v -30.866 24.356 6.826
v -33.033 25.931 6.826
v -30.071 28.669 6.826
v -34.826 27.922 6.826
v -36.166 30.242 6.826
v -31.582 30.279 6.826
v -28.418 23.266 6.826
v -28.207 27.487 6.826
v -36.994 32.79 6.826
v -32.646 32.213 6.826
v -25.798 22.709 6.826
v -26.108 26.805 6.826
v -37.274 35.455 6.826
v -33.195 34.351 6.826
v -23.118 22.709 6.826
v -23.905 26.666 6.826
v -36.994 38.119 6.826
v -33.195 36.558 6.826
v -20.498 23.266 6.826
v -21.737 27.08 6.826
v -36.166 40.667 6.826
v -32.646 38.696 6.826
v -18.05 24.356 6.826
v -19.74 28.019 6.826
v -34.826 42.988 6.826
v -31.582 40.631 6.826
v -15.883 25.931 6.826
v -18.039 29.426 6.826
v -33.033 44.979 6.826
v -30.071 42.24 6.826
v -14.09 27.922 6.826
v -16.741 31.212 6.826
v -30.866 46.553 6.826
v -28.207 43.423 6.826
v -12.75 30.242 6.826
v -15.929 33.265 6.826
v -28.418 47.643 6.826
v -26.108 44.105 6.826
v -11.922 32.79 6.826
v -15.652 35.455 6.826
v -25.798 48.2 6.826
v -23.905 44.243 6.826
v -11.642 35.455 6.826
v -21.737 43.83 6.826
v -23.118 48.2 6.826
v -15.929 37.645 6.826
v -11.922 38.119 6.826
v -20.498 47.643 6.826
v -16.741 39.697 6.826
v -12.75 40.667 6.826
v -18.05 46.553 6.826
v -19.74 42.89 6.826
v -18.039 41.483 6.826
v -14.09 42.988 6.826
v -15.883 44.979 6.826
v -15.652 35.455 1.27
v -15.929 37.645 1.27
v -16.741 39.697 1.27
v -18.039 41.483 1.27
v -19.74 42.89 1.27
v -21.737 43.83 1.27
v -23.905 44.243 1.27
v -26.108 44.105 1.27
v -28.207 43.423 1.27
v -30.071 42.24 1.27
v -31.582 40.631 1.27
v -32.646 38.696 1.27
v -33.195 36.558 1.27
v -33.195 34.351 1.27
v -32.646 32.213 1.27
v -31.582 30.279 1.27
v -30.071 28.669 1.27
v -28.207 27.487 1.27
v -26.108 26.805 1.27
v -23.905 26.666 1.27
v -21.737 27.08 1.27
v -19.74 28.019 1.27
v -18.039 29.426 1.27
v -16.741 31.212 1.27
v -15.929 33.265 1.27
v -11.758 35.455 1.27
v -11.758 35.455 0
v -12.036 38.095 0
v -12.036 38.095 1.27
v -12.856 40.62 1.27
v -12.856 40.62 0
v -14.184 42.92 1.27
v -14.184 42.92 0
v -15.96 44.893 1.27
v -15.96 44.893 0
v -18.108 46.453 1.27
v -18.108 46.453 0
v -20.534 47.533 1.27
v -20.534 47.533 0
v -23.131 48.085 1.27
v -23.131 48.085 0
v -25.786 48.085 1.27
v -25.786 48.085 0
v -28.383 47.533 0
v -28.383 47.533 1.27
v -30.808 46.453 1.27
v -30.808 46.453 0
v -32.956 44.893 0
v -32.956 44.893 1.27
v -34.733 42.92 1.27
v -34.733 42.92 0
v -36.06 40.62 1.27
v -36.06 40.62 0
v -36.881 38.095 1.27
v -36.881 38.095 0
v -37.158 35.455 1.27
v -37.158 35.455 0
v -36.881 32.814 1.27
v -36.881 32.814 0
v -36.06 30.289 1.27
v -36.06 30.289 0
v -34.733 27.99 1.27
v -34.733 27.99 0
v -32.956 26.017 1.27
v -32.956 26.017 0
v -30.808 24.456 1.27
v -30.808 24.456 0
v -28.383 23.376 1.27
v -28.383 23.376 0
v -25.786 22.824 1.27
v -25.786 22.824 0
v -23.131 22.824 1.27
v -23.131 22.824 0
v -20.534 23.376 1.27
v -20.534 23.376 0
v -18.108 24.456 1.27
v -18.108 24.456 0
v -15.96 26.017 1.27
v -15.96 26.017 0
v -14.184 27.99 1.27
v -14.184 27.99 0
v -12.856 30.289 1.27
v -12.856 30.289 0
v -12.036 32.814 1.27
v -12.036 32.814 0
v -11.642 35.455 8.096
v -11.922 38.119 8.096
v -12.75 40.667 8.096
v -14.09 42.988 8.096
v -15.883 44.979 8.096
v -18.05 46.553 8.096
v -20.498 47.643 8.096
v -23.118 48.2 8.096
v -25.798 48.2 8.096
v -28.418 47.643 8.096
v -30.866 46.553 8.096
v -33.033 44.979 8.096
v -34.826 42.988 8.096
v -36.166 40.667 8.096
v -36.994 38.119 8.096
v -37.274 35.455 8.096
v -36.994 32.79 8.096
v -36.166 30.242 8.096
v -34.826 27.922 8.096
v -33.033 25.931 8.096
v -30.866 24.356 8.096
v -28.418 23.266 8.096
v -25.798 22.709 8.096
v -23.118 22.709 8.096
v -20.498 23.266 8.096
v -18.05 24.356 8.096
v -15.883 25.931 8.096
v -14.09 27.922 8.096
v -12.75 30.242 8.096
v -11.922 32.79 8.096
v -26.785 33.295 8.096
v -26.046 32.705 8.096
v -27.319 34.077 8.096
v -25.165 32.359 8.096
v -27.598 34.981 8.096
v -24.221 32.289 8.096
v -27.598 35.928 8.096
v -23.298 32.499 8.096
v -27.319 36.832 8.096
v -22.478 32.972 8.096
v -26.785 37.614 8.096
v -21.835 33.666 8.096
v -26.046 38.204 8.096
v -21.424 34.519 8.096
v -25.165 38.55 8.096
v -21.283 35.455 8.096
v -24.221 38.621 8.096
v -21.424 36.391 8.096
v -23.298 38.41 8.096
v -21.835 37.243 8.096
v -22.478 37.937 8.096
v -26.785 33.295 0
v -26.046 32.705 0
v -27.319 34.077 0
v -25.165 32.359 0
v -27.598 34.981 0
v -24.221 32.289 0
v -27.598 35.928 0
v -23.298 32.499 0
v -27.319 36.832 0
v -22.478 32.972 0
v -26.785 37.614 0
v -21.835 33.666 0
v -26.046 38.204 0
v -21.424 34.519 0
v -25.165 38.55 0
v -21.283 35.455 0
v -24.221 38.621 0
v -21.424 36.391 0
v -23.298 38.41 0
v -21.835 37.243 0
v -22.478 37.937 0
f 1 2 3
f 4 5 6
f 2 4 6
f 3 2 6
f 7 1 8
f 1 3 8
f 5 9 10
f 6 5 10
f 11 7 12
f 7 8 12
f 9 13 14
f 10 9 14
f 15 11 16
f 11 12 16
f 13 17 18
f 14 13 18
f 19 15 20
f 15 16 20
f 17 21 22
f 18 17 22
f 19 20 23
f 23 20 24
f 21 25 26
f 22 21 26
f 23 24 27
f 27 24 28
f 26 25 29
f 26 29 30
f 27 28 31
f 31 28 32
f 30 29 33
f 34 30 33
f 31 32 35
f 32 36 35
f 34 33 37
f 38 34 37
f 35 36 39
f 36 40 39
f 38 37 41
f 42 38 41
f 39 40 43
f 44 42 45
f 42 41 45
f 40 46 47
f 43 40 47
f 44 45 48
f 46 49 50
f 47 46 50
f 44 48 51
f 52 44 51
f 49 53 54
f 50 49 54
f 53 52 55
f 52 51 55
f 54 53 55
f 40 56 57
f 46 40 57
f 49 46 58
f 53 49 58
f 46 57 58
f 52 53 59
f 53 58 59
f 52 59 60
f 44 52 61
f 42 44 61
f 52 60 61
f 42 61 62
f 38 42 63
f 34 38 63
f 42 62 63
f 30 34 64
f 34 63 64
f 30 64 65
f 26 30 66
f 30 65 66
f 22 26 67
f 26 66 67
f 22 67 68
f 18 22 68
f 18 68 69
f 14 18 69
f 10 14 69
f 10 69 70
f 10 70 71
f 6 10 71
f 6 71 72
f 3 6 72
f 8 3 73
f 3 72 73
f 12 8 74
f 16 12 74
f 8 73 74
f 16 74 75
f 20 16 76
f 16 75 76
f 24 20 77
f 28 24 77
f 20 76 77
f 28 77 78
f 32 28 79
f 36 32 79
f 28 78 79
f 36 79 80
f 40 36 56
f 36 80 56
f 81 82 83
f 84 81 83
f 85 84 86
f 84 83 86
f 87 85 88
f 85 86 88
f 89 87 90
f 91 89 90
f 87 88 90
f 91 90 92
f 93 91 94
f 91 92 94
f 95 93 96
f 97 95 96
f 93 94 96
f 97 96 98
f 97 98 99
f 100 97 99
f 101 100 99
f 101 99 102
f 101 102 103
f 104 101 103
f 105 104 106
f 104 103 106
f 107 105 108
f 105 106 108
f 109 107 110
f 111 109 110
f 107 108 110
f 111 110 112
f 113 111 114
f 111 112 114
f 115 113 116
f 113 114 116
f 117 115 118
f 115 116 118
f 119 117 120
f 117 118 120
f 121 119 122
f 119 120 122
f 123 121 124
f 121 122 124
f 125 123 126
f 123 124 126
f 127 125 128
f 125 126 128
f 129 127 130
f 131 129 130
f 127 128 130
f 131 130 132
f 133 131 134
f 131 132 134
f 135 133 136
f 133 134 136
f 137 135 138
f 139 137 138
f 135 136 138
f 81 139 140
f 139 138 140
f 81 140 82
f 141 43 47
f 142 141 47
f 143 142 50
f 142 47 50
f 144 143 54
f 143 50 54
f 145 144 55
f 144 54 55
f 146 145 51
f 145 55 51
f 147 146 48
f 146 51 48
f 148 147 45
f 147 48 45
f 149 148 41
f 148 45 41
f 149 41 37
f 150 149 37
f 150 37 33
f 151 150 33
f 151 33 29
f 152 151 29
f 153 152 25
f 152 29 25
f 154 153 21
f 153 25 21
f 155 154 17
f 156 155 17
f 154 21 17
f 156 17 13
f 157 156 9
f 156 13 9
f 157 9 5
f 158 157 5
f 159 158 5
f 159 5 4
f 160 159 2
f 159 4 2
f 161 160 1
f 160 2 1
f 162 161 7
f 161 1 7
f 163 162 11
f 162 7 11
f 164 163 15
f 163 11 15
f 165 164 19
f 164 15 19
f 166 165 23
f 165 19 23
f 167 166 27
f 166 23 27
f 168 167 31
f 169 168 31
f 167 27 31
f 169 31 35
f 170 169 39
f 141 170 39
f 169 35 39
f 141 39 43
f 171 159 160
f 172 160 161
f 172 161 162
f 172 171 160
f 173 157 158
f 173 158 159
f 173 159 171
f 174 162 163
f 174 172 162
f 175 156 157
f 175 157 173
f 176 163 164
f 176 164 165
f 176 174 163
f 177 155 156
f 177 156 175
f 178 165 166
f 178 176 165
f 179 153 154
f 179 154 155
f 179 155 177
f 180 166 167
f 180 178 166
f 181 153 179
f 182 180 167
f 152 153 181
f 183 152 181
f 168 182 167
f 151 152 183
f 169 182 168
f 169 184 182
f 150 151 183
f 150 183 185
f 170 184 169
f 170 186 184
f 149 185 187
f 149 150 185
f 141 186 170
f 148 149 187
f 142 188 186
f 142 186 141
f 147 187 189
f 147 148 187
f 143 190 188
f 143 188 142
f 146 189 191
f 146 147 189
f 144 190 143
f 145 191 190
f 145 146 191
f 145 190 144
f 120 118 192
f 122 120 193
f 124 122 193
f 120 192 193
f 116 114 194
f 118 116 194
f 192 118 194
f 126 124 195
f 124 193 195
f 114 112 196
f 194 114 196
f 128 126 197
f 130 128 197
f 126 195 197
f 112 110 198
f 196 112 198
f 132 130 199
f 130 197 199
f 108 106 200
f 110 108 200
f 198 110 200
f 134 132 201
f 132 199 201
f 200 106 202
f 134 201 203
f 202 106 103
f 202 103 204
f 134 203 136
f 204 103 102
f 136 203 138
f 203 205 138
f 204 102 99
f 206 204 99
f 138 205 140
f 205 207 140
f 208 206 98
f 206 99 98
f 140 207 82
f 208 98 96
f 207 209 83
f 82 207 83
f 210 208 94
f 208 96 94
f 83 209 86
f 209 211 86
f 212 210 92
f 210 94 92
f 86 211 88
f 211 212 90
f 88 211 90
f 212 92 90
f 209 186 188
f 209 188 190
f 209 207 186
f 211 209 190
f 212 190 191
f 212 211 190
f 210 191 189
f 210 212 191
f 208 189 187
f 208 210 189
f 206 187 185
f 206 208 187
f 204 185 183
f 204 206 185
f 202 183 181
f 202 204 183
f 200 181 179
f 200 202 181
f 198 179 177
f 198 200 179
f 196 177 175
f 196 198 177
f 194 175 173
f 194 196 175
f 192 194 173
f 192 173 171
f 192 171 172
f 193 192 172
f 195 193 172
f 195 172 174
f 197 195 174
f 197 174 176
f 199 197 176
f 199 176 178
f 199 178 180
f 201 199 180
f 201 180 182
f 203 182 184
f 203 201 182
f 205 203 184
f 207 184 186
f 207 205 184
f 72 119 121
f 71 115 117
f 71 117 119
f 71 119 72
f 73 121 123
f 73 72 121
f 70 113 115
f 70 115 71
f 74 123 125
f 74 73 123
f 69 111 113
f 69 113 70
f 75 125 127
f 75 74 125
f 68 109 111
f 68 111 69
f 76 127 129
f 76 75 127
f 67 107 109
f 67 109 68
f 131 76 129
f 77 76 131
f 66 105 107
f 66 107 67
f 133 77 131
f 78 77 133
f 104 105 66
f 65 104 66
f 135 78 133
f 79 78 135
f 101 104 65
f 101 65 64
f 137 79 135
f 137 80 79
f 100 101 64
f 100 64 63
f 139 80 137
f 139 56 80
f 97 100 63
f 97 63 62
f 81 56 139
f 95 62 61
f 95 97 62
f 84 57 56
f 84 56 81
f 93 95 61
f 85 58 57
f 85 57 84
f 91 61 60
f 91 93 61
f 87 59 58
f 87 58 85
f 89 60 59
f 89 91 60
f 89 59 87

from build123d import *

# Parameters (mm, degrees)
F0_R     = 12.7
F0_R_2   = 3.175
F1_DEPTH = 1.27
F2_R     = 8.8060698198
F2_R_2   = 3.175
F3_DEPTH = 5.55625
F4_R     = 12.8157676945
F4_R_2   = 8.8060698198
F4_R_3   = 3.175
F5_DEPTH = 1.27


with BuildPart() as f1:
    # F0 (on Top) → F1 (new body)
    with BuildSketch(Plane.XY):
        with Locations((-24.458033964, 35.4546681046)):
            Circle(F0_R)
        with Locations((-24.458033964, 35.4546681046)):
            Circle(F0_R_2, mode=Mode.SUBTRACT)
    extrude(amount=F1_DEPTH)

    # F2 (on face) → F3 (join)
    with BuildSketch(Plane.XY.offset(1.27)):
        with Locations((-24.458033964, 35.4546681046)):
            Circle(F2_R)
        with Locations((-24.458033964, 35.4546681046)):
            Circle(F2_R_2, mode=Mode.SUBTRACT)
    extrude(amount=F3_DEPTH)

    # F4 (on face) → F5 (join)
    with BuildSketch(Plane.XY.offset(6.82625)):
        with Locations((-24.458033964, 35.4546681046)):
            Circle(F4_R)
        with Locations((-24.458033964, 35.4546681046)):
            Circle(F4_R_2, mode=Mode.SUBTRACT)
        with Locations((-24.458033964, 35.4546681046)):
            Circle(F4_R_2)
        with Locations((-24.458033964, 35.4546681046)):
            Circle(F4_R_3, mode=Mode.SUBTRACT)
    extrude(amount=F5_DEPTH)


solid = f1.part
